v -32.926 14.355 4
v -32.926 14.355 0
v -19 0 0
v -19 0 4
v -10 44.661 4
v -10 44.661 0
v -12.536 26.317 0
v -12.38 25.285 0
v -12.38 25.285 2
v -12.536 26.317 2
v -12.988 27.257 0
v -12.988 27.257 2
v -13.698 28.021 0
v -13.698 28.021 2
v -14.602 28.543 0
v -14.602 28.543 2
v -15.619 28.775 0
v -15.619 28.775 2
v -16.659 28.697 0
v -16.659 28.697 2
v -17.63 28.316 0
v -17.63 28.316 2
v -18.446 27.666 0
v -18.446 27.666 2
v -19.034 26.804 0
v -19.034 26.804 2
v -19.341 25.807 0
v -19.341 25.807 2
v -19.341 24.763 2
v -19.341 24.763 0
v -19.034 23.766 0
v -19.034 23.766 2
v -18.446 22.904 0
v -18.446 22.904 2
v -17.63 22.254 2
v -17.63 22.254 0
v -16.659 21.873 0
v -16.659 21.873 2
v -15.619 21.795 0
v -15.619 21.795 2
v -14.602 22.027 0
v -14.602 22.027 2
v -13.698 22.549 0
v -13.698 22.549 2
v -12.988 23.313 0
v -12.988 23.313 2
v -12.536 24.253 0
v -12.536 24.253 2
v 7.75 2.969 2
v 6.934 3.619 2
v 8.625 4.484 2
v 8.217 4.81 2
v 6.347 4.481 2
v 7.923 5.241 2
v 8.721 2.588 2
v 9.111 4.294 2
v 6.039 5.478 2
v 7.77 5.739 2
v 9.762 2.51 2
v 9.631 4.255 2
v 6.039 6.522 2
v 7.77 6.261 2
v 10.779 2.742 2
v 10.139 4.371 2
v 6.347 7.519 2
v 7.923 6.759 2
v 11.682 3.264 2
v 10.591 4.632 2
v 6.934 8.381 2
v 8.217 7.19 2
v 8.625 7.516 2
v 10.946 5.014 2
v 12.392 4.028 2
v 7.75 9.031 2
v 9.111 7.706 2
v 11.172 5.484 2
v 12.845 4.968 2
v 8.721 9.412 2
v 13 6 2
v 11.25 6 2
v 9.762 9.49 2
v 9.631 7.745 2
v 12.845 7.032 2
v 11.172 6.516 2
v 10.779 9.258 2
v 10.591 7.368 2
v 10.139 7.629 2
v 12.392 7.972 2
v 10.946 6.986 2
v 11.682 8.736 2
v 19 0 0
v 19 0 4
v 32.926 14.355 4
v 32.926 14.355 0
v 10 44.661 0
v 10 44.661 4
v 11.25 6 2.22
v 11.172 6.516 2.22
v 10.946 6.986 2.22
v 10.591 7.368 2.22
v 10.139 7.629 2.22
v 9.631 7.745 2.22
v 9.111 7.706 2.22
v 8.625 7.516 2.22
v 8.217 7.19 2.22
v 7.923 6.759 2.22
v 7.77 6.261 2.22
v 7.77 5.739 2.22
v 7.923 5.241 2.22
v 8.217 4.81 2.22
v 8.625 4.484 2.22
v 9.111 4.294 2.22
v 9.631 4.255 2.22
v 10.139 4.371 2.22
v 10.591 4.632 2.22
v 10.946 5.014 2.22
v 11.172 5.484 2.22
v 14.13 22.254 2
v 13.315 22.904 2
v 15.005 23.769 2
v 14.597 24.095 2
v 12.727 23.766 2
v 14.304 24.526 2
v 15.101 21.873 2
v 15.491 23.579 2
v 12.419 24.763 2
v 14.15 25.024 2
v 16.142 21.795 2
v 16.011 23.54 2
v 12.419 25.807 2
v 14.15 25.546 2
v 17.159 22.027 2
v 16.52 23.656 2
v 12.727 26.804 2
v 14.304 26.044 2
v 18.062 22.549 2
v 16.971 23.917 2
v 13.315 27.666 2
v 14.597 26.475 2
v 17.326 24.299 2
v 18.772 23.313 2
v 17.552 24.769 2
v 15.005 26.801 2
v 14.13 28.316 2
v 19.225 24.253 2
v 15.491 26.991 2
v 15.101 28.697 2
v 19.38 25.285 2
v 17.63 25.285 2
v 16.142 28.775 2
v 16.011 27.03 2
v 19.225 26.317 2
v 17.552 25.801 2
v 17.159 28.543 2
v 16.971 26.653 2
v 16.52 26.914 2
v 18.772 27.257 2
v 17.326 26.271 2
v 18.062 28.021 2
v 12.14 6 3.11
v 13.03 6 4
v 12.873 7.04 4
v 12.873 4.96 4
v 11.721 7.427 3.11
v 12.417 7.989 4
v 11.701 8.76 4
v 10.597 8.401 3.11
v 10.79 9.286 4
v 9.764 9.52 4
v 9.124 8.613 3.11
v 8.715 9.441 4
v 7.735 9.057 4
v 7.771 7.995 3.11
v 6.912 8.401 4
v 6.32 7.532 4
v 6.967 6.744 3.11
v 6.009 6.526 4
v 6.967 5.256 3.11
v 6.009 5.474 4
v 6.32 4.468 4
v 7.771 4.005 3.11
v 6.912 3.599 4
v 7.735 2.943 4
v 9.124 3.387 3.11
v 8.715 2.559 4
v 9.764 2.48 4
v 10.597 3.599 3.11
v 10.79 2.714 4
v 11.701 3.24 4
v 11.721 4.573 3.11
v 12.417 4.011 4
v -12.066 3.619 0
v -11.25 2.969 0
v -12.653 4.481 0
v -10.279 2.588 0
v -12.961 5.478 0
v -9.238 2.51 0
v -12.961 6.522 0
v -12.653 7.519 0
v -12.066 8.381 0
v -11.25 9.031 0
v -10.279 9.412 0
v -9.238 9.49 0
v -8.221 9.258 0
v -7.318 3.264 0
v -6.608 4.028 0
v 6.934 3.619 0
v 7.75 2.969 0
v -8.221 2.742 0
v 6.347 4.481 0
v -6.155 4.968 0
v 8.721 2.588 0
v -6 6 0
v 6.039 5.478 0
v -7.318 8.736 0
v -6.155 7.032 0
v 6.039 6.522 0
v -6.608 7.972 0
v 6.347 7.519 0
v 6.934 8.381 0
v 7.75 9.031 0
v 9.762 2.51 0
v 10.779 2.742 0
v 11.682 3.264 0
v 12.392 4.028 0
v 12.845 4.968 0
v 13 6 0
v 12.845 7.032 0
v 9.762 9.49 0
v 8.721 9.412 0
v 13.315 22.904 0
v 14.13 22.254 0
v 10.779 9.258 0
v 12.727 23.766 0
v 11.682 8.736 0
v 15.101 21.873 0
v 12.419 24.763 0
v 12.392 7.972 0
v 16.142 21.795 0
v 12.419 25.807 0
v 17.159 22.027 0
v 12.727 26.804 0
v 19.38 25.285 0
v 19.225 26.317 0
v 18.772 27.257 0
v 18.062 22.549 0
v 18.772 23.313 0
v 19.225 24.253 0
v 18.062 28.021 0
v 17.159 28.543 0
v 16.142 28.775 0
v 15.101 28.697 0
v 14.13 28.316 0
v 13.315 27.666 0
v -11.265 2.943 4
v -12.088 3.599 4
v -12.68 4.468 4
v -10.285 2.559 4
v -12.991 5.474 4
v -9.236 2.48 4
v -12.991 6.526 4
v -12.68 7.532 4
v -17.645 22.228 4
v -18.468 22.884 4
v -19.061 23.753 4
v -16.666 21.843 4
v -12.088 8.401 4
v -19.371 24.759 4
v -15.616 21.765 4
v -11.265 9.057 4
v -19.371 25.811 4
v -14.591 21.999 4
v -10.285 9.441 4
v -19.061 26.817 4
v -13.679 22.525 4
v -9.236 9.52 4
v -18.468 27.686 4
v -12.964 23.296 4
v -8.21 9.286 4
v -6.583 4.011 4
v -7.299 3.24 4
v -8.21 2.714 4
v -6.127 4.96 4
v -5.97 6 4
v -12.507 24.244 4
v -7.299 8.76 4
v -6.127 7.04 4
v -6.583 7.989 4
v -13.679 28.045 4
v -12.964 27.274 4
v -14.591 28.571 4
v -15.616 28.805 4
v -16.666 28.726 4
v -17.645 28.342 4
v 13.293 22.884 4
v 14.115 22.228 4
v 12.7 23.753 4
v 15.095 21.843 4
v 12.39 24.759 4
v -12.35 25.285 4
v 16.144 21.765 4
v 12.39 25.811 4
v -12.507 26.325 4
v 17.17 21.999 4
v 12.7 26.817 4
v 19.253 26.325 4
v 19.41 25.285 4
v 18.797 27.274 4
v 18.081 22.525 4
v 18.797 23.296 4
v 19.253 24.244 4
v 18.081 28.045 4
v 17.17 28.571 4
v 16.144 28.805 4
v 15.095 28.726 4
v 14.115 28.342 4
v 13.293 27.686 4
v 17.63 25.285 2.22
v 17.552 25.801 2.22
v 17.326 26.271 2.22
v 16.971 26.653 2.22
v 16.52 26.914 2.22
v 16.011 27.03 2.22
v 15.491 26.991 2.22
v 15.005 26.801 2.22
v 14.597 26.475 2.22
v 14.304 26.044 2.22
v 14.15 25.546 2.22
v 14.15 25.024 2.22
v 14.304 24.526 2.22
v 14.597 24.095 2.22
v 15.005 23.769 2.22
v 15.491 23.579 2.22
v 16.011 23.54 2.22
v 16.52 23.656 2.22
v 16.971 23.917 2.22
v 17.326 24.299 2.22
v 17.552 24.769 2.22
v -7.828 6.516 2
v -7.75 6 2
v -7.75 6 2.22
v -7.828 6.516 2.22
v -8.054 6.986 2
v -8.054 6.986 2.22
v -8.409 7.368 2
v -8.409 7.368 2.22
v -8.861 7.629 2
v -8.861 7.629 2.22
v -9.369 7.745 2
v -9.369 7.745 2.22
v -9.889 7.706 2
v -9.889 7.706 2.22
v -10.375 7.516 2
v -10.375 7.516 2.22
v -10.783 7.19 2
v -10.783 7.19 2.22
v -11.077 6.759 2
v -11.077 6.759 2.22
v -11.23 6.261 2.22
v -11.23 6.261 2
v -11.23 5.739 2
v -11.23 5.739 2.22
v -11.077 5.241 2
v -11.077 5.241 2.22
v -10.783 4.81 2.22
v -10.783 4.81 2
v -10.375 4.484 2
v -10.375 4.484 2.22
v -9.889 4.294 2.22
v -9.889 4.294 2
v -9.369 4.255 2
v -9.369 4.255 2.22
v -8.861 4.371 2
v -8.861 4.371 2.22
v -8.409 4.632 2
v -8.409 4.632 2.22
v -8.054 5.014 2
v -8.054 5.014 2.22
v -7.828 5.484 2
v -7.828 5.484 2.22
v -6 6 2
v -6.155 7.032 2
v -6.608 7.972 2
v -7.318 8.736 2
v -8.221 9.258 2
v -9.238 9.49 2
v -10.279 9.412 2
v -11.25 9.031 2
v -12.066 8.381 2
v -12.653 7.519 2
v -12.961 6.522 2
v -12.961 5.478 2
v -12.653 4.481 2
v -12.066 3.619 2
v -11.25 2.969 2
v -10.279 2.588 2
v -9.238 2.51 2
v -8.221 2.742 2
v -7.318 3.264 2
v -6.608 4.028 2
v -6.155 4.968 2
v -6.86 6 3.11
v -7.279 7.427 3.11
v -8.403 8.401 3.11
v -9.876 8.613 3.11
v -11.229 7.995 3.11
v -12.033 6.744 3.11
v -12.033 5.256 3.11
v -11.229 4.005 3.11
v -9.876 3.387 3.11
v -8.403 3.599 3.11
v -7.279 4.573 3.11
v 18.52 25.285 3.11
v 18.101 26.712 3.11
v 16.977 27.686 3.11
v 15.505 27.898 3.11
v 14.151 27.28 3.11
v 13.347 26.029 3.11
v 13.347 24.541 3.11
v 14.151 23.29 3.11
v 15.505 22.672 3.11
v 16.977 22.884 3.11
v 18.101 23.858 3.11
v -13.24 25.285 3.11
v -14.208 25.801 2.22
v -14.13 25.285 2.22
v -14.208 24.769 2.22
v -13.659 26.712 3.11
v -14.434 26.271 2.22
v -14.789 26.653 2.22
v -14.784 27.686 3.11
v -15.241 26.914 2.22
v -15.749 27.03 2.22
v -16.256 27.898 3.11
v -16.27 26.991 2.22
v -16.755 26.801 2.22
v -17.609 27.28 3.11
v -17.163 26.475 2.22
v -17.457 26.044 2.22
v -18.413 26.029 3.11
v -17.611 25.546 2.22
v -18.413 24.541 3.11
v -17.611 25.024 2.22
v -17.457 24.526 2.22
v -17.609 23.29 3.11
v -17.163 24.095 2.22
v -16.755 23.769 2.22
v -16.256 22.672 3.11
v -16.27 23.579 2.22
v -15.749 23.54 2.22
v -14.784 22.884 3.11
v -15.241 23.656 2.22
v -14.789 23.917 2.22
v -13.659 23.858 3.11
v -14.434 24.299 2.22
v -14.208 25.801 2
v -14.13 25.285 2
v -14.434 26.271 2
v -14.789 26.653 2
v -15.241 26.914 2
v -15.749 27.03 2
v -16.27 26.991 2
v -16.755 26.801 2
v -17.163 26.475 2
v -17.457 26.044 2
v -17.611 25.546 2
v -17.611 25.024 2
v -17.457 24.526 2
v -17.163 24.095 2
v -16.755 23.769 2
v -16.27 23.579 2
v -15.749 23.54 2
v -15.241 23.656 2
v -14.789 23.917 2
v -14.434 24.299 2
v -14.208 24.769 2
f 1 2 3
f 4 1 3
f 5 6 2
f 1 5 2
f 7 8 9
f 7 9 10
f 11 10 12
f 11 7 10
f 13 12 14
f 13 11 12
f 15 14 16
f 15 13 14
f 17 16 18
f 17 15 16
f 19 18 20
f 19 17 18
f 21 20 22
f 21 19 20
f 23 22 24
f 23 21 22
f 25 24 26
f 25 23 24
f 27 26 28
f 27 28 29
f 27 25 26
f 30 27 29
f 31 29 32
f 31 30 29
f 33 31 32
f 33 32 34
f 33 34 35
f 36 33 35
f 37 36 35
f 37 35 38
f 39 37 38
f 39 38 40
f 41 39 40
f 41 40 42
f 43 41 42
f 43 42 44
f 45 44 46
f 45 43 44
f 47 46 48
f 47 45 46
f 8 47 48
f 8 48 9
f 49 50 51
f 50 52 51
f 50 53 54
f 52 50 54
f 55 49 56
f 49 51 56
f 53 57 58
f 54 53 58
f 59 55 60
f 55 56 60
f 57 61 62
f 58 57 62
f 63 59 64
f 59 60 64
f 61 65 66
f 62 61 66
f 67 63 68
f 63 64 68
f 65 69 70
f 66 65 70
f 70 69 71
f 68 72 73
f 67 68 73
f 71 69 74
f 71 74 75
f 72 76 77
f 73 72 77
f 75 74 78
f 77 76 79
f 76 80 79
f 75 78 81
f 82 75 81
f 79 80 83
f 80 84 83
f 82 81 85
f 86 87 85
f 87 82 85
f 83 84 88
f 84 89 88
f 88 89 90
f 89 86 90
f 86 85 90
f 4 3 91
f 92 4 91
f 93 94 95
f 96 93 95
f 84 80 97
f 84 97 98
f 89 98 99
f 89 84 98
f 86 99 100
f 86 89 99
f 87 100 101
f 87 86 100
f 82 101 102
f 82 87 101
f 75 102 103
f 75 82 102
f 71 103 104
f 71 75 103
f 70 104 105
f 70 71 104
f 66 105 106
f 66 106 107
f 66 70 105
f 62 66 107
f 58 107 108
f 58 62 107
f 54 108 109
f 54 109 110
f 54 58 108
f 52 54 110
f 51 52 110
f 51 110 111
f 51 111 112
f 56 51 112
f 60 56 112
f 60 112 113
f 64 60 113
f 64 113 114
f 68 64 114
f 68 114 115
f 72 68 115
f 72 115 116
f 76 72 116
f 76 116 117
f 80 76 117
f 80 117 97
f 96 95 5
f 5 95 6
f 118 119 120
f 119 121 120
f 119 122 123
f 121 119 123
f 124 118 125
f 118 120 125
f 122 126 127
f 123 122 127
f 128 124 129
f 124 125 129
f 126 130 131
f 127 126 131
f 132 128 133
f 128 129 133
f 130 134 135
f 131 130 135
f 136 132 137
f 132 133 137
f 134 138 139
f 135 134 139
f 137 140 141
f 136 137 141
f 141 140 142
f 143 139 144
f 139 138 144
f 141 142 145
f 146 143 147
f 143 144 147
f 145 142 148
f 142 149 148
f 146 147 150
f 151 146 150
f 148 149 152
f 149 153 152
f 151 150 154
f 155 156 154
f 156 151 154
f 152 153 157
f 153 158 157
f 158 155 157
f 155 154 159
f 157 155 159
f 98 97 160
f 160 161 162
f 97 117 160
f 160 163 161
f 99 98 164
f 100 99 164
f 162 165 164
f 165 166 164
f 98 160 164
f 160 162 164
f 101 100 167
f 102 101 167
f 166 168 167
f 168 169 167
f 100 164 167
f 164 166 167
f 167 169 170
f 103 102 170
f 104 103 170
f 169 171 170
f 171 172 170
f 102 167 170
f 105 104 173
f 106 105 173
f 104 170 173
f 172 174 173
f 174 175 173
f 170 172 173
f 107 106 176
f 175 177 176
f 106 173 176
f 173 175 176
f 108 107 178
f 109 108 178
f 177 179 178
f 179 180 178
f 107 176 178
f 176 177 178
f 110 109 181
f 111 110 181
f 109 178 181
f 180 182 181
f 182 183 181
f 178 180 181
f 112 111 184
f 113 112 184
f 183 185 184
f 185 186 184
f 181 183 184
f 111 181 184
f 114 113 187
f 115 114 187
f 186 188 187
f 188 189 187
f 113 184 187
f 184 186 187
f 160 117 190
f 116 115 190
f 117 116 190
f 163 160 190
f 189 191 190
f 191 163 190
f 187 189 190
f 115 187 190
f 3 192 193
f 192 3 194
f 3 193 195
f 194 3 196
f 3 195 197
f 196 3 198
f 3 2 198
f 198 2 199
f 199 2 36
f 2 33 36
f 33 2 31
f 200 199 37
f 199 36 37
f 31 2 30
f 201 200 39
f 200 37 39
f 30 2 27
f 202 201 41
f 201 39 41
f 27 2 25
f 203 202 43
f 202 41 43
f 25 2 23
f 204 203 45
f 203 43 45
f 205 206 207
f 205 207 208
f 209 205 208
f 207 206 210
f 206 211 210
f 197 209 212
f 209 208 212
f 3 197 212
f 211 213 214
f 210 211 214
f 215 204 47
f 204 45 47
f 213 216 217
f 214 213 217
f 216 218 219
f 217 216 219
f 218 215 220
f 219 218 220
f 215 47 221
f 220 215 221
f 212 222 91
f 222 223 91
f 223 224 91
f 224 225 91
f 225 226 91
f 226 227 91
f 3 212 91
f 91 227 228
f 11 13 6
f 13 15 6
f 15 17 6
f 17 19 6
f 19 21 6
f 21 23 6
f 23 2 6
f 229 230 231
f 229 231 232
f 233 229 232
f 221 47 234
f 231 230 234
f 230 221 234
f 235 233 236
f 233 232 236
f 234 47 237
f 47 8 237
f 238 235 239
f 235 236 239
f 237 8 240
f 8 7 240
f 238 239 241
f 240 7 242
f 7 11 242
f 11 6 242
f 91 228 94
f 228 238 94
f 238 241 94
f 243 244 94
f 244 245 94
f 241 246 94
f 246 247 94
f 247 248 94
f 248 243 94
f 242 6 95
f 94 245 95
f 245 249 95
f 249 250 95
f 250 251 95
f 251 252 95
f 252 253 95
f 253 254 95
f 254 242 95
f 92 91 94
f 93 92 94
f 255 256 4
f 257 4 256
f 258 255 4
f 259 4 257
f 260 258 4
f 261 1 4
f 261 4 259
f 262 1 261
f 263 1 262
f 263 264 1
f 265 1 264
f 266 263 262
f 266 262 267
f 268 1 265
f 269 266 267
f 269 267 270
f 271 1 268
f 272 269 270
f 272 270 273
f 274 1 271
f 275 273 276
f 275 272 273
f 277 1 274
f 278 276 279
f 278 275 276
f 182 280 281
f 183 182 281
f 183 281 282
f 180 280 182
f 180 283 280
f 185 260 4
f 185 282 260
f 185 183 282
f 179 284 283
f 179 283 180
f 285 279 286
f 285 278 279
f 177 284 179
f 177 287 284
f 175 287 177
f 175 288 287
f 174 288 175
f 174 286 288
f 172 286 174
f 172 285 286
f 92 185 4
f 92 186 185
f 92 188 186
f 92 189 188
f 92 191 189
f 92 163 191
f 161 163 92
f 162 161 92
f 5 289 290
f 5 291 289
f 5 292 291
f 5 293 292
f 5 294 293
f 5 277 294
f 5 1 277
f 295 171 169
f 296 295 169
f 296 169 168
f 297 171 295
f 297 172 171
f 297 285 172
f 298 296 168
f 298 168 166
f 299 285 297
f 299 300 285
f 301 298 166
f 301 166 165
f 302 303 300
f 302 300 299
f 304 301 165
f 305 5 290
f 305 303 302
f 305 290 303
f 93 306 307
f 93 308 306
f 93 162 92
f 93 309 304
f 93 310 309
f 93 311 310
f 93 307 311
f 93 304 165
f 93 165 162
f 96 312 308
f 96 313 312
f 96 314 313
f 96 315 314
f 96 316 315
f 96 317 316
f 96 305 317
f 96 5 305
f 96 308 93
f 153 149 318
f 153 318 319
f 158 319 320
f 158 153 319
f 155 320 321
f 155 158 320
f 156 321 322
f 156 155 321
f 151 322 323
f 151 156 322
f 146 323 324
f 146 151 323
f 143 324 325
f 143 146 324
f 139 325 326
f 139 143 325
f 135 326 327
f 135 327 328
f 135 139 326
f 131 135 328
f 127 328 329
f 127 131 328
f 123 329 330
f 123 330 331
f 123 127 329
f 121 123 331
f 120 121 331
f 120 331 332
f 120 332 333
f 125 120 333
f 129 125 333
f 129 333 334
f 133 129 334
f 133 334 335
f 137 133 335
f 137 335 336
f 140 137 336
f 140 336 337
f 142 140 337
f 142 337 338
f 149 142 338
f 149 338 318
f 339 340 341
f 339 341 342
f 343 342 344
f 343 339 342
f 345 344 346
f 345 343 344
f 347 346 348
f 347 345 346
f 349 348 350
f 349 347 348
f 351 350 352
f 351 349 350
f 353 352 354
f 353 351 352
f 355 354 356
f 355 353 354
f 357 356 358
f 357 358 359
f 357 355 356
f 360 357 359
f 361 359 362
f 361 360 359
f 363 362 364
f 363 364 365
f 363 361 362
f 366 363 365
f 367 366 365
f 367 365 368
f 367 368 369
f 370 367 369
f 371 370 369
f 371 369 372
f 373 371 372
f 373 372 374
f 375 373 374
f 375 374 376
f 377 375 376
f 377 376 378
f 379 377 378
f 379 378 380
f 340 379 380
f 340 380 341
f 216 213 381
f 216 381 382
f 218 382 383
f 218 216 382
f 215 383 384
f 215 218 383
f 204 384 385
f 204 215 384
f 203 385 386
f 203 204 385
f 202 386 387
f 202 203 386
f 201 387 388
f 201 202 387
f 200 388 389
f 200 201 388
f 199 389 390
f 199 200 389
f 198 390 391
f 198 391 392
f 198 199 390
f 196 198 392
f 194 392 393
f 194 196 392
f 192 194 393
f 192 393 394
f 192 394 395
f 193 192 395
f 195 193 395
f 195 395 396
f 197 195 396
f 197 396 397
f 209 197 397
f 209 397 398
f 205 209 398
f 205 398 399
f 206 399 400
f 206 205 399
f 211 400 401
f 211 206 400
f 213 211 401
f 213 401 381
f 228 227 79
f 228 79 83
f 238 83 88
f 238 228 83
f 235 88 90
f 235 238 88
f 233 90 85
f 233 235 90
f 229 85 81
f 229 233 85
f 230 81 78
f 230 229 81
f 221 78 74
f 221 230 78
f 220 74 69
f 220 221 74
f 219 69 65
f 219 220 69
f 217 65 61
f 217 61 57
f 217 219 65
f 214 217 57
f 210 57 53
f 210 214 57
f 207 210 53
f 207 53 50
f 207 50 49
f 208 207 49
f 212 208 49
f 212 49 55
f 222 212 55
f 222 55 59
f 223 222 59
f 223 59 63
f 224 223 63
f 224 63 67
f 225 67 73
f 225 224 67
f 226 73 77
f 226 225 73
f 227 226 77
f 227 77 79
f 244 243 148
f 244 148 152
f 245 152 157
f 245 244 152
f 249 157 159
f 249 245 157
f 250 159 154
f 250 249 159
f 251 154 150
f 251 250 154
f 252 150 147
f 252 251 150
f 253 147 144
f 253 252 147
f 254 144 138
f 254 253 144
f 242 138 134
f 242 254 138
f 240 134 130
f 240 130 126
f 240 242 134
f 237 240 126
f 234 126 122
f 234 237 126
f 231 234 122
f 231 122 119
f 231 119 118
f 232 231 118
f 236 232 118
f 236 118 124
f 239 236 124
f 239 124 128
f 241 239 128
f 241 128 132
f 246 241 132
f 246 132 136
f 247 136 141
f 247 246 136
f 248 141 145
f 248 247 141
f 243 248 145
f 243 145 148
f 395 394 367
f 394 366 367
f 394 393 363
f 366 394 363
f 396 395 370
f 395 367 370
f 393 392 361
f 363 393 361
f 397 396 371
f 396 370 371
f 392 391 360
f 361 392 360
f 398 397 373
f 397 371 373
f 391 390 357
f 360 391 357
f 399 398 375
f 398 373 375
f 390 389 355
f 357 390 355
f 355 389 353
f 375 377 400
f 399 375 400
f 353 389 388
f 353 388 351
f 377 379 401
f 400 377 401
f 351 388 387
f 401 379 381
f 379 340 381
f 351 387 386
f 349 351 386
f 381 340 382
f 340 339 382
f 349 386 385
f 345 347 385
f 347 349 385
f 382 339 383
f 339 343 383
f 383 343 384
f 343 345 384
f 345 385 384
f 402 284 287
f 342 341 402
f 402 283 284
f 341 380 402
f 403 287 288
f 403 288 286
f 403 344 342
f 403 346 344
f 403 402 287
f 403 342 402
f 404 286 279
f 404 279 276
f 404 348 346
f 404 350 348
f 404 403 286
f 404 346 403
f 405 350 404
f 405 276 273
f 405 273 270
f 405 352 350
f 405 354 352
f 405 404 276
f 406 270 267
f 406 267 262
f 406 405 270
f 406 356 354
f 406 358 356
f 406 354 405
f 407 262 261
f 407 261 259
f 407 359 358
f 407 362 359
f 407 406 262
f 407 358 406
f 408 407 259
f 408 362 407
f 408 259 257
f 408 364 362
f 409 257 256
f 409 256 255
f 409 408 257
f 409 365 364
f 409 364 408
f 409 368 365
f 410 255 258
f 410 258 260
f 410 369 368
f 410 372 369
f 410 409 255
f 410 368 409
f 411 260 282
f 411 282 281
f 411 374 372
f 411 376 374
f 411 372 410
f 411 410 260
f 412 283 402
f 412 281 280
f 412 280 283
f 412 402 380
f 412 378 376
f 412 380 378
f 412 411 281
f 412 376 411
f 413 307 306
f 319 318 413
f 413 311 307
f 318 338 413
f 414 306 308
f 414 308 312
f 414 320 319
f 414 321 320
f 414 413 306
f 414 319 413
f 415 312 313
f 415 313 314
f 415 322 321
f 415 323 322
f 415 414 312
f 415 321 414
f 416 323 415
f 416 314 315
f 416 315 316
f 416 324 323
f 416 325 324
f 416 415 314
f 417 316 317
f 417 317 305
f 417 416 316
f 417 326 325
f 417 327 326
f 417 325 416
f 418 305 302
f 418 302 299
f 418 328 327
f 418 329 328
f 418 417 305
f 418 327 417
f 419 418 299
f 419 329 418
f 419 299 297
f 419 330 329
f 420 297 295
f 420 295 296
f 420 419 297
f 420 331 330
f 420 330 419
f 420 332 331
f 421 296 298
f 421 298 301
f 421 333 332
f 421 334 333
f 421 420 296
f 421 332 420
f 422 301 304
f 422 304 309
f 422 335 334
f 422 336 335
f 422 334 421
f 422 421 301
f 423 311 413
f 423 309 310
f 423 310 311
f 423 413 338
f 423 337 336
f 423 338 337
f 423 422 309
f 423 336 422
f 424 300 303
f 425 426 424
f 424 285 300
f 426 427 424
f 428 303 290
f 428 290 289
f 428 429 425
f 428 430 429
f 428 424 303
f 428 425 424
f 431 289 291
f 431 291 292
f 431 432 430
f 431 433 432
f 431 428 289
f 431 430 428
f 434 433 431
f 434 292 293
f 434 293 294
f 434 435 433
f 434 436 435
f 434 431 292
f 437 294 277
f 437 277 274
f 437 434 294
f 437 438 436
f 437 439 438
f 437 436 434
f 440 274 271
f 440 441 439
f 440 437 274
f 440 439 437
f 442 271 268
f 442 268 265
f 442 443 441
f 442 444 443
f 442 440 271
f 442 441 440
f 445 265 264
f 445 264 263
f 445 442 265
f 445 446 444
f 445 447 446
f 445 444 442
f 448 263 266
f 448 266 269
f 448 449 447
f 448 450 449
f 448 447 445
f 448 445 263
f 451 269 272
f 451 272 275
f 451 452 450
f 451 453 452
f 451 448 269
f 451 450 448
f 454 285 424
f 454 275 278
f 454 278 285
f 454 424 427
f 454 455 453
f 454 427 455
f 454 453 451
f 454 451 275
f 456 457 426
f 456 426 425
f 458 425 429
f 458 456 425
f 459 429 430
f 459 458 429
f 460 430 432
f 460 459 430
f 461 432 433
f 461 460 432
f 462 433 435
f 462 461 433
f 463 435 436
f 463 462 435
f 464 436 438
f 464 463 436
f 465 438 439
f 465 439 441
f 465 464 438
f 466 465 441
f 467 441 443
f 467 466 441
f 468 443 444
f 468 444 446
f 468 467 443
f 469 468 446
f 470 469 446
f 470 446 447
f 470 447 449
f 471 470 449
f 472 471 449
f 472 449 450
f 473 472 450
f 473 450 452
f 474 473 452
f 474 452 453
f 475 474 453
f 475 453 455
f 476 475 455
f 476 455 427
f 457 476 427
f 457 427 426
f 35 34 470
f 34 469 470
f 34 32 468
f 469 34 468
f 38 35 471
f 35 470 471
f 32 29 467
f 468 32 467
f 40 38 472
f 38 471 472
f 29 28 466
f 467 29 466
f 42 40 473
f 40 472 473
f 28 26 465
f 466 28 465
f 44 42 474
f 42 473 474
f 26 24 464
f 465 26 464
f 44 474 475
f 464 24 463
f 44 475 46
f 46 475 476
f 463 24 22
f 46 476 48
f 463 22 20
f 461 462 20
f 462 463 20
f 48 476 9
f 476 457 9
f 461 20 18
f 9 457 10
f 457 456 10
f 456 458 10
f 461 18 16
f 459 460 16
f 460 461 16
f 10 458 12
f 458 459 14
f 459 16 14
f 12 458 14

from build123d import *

# Parameters (mm, degrees)
F0_R     = 3.5
F1_DEPTH = 4
F0_R_2   = 1.75
F2_DEPTH = 4
F3_SIZE  = 1.78
F4_DEPTH = 2


# Not quite as in the source:
# - a feature names something its author has since deleted; it is built from what else it names


with BuildPart() as f1:
    # F0 (on Top) → F1 (new body)
    with BuildSketch(Plane.XY):
        Polygon((0, 44.6608208763), (0, 0), (19, 0), (32.9255871796, 14.3554178519), (10, 44.6608208763), align=None)
        with Locations((9.5, 6)):
            Circle(F0_R, mode=Mode.SUBTRACT)
        with Locations((15.8802193485, 25.2849848836)):
            Circle(F0_R, mode=Mode.SUBTRACT)
        Polygon((-9.5, 0), (0, 0), (0, 44.6608208763), (-10, 44.6608208763), (-32.9255871796, 14.3554178519), (-19, 0), align=None)
        with Locations((-9.5, 6)):
            Circle(F0_R, mode=Mode.SUBTRACT)
        with Locations((-15.8802193485, 25.2849848836)):
            Circle(F0_R, mode=Mode.SUBTRACT)
    extrude(amount=F1_DEPTH)

    # F0 (on Top) → F2 (join)
    with BuildSketch(Plane.XY):
        with Locations((9.5, 6)):
            Circle(F0_R)
        with Locations((9.5, 6)):
            Circle(F0_R_2, mode=Mode.SUBTRACT)
        with Locations((-9.5, 6)):
            Circle(F0_R)
        with Locations((-9.5, 6)):
            Circle(F0_R_2, mode=Mode.SUBTRACT)
        with Locations((-15.8802193485, 25.2849848836)):
            Circle(F0_R)
        with Locations((-15.8802193485, 25.2849848836)):
            Circle(F0_R_2, mode=Mode.SUBTRACT)
        with Locations((15.8802193485, 25.2849848836)):
            Circle(F0_R)
        with Locations((15.8802193485, 25.2849848836)):
            Circle(F0_R_2, mode=Mode.SUBTRACT)
    extrude(amount=F2_DEPTH)

    # F3
    f3_edges = [f1.edges().sort_by_distance(p)[0] for p in [
        (14.130219, 25.284985, 4),
        (-17.630219, 25.284985, 4),
        (-11.25, 6, 4),
        (7.75, 6, 4),
    ]]
    chamfer(f3_edges, length=F3_SIZE)

    # F0 (on Top) → F4 (cut)
    with BuildSketch(Plane.XY):
        with Locations((-15.8802193485, 25.2849848836)):
            Circle(F0_R)
        with Locations((-15.8802193485, 25.2849848836)):
            Circle(F0_R_2, mode=Mode.SUBTRACT)
        with Locations((15.8802193485, 25.2849848836)):
            Circle(F0_R)
        with Locations((15.8802193485, 25.2849848836)):
            Circle(F0_R_2, mode=Mode.SUBTRACT)
        with Locations((9.5, 6)):
            Circle(F0_R)
        with Locations((9.5, 6)):
            Circle(F0_R_2, mode=Mode.SUBTRACT)
        with Locations((-9.5, 6)):
            Circle(F0_R)
        with Locations((-9.5, 6)):
            Circle(F0_R_2, mode=Mode.SUBTRACT)
    extrude(amount=F4_DEPTH, mode=Mode.SUBTRACT)


solid = f1.part
